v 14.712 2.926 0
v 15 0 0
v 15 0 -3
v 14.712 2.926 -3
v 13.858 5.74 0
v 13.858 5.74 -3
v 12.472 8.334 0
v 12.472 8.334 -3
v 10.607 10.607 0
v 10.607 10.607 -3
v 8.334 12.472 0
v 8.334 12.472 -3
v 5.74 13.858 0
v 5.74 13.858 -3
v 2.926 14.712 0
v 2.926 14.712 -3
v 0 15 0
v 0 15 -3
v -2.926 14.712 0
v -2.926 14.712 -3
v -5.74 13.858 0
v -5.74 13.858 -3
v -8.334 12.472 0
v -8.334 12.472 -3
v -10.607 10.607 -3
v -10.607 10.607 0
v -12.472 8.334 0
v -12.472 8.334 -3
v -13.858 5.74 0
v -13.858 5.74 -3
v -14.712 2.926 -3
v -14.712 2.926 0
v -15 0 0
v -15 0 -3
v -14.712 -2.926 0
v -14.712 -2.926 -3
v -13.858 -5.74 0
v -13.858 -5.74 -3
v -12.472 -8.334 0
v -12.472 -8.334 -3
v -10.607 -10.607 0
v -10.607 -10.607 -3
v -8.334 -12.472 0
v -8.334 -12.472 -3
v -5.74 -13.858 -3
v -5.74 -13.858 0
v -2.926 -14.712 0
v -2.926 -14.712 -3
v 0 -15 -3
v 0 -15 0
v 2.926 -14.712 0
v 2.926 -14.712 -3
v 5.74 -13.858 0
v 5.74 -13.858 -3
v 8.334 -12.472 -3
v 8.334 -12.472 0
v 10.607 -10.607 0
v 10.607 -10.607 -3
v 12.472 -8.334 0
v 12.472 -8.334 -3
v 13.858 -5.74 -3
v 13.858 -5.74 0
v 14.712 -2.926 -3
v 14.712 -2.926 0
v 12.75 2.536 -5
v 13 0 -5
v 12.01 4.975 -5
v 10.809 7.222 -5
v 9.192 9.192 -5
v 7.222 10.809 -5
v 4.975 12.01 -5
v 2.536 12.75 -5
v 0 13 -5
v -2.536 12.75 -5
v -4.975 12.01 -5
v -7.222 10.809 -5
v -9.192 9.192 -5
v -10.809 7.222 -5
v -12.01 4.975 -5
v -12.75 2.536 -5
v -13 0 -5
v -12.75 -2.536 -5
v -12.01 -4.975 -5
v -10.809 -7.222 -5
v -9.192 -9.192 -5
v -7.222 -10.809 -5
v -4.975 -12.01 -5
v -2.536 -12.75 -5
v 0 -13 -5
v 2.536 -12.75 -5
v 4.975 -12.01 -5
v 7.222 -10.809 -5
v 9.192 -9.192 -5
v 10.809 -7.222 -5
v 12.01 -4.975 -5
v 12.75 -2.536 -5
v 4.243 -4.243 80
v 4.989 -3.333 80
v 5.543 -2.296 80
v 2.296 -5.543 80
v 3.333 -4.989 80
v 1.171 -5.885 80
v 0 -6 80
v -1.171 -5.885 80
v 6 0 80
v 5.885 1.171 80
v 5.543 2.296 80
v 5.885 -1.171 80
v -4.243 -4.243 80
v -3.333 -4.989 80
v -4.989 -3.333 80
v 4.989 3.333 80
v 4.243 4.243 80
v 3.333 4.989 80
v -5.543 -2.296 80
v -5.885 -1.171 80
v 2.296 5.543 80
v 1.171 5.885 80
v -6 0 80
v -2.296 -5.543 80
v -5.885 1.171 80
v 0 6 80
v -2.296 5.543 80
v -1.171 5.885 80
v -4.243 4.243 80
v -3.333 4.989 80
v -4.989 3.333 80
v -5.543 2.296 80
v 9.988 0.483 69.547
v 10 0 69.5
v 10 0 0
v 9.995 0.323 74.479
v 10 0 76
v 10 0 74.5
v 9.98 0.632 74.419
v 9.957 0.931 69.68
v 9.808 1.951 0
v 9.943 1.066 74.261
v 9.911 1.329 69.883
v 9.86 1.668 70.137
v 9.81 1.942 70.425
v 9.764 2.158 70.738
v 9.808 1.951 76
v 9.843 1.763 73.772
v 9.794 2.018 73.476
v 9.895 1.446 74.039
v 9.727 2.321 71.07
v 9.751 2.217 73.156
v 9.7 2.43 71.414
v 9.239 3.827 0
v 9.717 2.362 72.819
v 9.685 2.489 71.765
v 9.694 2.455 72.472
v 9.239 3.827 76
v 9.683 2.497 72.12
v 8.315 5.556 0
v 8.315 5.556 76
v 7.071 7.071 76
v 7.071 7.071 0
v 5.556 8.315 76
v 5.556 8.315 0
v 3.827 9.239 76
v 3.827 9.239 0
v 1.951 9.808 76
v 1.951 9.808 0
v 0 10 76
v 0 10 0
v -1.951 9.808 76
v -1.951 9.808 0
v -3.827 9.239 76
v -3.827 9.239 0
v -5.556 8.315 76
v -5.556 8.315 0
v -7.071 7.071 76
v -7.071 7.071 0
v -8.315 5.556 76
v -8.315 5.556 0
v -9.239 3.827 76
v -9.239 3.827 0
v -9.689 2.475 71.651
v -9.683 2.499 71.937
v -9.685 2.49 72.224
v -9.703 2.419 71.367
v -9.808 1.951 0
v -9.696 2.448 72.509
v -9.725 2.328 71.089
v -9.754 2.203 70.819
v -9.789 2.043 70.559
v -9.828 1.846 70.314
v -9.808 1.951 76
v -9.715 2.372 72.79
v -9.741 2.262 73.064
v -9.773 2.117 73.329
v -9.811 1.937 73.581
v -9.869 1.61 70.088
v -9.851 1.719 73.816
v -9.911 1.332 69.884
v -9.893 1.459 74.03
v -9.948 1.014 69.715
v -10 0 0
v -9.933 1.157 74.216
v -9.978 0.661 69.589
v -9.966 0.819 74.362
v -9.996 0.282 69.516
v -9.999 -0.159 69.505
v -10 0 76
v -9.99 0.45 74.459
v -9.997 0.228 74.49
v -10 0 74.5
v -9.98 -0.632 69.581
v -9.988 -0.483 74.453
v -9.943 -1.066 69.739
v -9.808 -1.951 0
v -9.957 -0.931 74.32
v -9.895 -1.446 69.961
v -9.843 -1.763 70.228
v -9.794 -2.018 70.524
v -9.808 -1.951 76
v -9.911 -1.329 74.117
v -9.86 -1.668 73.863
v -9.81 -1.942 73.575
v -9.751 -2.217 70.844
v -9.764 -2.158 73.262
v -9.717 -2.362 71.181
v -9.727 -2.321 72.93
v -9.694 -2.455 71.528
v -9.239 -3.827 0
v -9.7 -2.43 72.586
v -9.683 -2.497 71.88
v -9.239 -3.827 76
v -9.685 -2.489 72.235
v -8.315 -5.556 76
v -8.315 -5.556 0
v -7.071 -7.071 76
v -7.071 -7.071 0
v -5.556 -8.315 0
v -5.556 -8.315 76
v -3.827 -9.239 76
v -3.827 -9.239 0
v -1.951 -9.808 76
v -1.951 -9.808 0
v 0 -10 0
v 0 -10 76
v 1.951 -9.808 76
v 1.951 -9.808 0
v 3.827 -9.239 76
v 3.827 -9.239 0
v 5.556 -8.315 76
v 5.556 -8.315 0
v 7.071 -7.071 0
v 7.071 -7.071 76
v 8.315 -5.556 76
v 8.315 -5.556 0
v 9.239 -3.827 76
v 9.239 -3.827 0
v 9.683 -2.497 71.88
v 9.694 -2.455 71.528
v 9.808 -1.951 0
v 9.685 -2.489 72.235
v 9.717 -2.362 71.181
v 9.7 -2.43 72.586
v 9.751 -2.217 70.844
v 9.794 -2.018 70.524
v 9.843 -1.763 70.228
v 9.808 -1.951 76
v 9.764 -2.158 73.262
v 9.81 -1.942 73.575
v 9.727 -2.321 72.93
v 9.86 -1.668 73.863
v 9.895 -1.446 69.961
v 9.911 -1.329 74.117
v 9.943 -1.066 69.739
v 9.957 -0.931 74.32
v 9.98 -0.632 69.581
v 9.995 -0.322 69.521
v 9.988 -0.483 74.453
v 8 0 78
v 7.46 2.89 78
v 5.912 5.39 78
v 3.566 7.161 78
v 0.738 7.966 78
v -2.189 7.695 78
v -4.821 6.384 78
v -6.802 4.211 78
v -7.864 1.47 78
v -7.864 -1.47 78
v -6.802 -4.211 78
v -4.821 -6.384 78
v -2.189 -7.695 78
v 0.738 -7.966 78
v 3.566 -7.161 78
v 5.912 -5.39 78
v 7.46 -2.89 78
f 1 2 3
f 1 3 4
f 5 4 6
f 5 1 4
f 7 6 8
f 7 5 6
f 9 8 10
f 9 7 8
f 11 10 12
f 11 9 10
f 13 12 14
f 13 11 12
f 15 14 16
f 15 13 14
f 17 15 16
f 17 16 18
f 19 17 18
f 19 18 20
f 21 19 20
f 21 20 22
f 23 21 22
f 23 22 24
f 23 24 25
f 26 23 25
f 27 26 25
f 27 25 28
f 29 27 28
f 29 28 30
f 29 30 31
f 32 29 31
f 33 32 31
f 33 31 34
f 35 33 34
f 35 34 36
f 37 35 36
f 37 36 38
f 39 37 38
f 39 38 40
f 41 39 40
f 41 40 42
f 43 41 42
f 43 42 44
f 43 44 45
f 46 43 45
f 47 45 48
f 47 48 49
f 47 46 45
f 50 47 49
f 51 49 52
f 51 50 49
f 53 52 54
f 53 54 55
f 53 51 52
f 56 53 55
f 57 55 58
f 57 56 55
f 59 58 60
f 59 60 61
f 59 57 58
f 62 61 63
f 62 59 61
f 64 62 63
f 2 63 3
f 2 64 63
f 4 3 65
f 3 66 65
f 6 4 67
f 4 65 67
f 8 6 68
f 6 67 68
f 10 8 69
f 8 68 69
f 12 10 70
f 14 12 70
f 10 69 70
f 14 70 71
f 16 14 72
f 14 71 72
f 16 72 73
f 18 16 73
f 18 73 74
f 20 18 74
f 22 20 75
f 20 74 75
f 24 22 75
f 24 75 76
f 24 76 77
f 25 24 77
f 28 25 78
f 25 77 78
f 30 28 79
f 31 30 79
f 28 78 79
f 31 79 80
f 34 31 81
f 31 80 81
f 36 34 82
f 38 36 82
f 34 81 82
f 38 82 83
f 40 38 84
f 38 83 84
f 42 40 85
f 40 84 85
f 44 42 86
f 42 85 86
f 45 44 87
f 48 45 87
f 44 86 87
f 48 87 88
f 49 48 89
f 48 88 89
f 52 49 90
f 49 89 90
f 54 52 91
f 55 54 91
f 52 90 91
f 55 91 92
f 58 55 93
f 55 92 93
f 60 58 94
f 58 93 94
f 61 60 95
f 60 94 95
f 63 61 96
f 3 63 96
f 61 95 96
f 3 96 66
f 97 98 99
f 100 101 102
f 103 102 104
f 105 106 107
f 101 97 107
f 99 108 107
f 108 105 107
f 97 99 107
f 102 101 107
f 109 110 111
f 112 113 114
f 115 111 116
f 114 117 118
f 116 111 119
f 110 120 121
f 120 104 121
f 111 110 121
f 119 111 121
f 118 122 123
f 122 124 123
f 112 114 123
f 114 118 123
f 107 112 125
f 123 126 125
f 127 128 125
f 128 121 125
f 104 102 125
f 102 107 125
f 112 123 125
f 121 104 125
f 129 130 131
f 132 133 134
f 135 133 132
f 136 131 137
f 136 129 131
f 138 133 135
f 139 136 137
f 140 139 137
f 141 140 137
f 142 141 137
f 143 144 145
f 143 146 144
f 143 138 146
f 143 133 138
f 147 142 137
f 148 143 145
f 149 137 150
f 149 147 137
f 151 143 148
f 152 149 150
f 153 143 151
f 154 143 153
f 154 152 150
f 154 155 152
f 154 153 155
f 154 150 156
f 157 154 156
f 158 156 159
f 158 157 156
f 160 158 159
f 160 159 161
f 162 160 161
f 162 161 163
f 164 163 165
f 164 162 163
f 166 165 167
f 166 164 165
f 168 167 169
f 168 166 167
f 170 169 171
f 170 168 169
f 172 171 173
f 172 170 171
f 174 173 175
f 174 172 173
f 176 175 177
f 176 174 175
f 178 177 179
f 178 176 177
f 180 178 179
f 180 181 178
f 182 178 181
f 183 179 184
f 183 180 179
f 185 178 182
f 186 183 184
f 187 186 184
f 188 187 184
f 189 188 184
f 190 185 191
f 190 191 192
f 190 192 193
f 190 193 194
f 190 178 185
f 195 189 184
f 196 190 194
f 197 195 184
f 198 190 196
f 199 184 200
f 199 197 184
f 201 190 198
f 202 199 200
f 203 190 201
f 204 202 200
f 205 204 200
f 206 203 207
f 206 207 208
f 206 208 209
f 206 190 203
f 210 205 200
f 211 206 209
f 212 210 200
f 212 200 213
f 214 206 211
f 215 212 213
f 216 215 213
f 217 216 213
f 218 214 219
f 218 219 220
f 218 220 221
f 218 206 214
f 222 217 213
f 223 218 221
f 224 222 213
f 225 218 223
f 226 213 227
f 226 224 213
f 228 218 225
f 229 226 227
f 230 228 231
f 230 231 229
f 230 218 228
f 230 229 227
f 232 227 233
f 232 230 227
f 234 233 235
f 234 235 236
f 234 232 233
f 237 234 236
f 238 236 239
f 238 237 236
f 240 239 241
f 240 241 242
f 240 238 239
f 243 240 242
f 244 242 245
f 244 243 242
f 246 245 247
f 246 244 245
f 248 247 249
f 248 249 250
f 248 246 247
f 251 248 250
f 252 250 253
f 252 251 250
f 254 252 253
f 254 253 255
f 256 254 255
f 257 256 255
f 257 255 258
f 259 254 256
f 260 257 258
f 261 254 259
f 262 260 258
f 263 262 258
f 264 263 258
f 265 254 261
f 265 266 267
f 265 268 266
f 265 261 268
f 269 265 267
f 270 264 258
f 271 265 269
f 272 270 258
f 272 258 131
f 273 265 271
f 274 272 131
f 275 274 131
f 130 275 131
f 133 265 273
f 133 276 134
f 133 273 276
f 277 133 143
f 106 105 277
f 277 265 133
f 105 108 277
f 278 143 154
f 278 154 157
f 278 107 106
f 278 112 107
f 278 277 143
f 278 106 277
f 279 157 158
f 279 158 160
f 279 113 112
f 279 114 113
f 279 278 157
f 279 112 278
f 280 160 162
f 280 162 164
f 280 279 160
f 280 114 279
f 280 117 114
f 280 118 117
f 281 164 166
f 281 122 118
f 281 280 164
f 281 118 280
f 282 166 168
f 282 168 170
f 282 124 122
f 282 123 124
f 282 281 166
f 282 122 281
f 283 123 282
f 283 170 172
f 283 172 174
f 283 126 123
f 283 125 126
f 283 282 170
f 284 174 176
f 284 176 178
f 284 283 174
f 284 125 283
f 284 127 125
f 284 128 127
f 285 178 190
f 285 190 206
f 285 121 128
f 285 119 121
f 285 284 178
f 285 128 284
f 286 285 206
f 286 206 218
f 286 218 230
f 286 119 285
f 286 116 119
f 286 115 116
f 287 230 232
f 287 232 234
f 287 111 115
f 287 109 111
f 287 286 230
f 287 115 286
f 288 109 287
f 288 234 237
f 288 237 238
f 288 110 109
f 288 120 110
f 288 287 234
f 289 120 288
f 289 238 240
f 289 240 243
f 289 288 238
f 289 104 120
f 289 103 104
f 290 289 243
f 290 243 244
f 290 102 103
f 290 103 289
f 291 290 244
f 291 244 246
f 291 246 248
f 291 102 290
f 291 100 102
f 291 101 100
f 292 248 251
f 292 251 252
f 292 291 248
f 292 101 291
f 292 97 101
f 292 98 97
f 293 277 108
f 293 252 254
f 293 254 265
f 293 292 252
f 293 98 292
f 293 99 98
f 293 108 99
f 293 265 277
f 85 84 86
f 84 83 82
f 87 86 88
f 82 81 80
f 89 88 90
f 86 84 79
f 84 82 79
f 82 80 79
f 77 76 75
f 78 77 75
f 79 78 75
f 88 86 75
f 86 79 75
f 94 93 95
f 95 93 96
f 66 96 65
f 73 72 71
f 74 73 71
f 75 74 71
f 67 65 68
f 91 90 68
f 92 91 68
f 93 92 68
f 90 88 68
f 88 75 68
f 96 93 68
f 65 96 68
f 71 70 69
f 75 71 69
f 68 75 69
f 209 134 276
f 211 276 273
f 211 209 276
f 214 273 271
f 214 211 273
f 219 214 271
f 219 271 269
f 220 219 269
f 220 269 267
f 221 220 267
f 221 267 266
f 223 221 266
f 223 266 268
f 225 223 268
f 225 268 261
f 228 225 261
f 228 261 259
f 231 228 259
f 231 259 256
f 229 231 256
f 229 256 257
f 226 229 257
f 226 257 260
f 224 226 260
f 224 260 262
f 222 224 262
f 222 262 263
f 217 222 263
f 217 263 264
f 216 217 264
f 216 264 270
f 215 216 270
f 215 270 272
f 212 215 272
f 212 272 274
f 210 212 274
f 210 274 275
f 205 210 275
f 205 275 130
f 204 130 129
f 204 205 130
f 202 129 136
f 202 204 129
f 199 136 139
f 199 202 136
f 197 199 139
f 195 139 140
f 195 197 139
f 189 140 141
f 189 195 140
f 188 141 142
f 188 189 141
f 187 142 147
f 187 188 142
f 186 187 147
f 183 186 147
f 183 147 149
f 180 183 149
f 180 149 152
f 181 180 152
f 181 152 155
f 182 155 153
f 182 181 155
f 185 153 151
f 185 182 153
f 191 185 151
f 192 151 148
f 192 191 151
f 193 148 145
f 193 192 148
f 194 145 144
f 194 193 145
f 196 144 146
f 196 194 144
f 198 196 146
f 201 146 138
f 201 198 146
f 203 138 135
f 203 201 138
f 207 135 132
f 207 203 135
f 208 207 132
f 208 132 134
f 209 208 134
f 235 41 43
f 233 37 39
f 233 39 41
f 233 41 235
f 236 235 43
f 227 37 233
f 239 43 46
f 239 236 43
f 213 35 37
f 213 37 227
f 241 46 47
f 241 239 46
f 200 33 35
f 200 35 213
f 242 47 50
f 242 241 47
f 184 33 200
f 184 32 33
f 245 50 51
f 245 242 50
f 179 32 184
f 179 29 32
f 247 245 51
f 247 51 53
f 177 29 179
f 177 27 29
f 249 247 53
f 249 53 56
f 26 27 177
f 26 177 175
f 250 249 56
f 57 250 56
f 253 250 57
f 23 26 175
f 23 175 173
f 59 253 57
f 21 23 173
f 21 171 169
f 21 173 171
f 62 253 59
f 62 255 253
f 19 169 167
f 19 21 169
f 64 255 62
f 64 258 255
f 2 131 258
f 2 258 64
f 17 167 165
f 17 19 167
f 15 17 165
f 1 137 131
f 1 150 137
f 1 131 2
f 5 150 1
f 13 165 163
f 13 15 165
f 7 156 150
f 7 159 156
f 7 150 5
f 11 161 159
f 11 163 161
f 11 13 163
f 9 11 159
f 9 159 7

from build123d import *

# Parameters (mm, degrees)
SKETCH1_R               = 15
BASE_EXTRUDE_DEPTH      = 5
CHAMFER1_2_OUTLINE_W    = 10
CHAMFER1_2_OUTLINE_H    = 80
CHAMFER2_SIZE           = 4
CUT_EXTRUDE1_DEPTH      = 74.813887582
CUT_EXTRUDE1_DEPTH_BACK = 74.813887582
SKETCH3_R               = 2.5


with BuildPart() as part:
    # Sketch1 → Base-Extrude (new body)
    with BuildSketch(Plane.XY):
        Circle(SKETCH1_R)
    extrude(amount=-BASE_EXTRUDE_DEPTH)

    # Chamfer1: read off the stored shape, not the designer's step
    # Chamfer1 outline → Chamfer1 (revolve, cut)
    with BuildSketch(Plane.XZ):
        Polygon((15, -3), (13, -5), (15, -5), align=None)
    revolve(axis=Axis((0, 0, 0), (0, 0, 1)), mode=Mode.SUBTRACT)

    # Chamfer1 2 outline → Chamfer1 2 (revolve)
    with BuildSketch(Plane.XZ):
        with Locations((5, 40)):
            Rectangle(CHAMFER1_2_OUTLINE_W, CHAMFER1_2_OUTLINE_H)
    revolve(axis=Axis((0, 0, 0), (0, 0, 1)))

    # Chamfer2
    chamfer2_edges = [part.edges().sort_by_distance(p)[0] for p in [
        (-10, 0, 80),
    ]]
    chamfer(chamfer2_edges, length=CHAMFER2_SIZE)

    # Sketch3 → Cut-Extrude1 (cut, two sides: drawn at the far end of the back side and taken through both)
    with BuildSketch(Plane(origin=(0, 0, 9.3), x_dir=(0, -1, 0), z_dir=(1, 0, 0)).offset(-CUT_EXTRUDE1_DEPTH_BACK)):
        with Locations(Location((0, -62.7, 0), (0, 0, 270))):
            Circle(SKETCH3_R)
    extrude(amount=CUT_EXTRUDE1_DEPTH + CUT_EXTRUDE1_DEPTH_BACK, mode=Mode.SUBTRACT)


solid = part.part
